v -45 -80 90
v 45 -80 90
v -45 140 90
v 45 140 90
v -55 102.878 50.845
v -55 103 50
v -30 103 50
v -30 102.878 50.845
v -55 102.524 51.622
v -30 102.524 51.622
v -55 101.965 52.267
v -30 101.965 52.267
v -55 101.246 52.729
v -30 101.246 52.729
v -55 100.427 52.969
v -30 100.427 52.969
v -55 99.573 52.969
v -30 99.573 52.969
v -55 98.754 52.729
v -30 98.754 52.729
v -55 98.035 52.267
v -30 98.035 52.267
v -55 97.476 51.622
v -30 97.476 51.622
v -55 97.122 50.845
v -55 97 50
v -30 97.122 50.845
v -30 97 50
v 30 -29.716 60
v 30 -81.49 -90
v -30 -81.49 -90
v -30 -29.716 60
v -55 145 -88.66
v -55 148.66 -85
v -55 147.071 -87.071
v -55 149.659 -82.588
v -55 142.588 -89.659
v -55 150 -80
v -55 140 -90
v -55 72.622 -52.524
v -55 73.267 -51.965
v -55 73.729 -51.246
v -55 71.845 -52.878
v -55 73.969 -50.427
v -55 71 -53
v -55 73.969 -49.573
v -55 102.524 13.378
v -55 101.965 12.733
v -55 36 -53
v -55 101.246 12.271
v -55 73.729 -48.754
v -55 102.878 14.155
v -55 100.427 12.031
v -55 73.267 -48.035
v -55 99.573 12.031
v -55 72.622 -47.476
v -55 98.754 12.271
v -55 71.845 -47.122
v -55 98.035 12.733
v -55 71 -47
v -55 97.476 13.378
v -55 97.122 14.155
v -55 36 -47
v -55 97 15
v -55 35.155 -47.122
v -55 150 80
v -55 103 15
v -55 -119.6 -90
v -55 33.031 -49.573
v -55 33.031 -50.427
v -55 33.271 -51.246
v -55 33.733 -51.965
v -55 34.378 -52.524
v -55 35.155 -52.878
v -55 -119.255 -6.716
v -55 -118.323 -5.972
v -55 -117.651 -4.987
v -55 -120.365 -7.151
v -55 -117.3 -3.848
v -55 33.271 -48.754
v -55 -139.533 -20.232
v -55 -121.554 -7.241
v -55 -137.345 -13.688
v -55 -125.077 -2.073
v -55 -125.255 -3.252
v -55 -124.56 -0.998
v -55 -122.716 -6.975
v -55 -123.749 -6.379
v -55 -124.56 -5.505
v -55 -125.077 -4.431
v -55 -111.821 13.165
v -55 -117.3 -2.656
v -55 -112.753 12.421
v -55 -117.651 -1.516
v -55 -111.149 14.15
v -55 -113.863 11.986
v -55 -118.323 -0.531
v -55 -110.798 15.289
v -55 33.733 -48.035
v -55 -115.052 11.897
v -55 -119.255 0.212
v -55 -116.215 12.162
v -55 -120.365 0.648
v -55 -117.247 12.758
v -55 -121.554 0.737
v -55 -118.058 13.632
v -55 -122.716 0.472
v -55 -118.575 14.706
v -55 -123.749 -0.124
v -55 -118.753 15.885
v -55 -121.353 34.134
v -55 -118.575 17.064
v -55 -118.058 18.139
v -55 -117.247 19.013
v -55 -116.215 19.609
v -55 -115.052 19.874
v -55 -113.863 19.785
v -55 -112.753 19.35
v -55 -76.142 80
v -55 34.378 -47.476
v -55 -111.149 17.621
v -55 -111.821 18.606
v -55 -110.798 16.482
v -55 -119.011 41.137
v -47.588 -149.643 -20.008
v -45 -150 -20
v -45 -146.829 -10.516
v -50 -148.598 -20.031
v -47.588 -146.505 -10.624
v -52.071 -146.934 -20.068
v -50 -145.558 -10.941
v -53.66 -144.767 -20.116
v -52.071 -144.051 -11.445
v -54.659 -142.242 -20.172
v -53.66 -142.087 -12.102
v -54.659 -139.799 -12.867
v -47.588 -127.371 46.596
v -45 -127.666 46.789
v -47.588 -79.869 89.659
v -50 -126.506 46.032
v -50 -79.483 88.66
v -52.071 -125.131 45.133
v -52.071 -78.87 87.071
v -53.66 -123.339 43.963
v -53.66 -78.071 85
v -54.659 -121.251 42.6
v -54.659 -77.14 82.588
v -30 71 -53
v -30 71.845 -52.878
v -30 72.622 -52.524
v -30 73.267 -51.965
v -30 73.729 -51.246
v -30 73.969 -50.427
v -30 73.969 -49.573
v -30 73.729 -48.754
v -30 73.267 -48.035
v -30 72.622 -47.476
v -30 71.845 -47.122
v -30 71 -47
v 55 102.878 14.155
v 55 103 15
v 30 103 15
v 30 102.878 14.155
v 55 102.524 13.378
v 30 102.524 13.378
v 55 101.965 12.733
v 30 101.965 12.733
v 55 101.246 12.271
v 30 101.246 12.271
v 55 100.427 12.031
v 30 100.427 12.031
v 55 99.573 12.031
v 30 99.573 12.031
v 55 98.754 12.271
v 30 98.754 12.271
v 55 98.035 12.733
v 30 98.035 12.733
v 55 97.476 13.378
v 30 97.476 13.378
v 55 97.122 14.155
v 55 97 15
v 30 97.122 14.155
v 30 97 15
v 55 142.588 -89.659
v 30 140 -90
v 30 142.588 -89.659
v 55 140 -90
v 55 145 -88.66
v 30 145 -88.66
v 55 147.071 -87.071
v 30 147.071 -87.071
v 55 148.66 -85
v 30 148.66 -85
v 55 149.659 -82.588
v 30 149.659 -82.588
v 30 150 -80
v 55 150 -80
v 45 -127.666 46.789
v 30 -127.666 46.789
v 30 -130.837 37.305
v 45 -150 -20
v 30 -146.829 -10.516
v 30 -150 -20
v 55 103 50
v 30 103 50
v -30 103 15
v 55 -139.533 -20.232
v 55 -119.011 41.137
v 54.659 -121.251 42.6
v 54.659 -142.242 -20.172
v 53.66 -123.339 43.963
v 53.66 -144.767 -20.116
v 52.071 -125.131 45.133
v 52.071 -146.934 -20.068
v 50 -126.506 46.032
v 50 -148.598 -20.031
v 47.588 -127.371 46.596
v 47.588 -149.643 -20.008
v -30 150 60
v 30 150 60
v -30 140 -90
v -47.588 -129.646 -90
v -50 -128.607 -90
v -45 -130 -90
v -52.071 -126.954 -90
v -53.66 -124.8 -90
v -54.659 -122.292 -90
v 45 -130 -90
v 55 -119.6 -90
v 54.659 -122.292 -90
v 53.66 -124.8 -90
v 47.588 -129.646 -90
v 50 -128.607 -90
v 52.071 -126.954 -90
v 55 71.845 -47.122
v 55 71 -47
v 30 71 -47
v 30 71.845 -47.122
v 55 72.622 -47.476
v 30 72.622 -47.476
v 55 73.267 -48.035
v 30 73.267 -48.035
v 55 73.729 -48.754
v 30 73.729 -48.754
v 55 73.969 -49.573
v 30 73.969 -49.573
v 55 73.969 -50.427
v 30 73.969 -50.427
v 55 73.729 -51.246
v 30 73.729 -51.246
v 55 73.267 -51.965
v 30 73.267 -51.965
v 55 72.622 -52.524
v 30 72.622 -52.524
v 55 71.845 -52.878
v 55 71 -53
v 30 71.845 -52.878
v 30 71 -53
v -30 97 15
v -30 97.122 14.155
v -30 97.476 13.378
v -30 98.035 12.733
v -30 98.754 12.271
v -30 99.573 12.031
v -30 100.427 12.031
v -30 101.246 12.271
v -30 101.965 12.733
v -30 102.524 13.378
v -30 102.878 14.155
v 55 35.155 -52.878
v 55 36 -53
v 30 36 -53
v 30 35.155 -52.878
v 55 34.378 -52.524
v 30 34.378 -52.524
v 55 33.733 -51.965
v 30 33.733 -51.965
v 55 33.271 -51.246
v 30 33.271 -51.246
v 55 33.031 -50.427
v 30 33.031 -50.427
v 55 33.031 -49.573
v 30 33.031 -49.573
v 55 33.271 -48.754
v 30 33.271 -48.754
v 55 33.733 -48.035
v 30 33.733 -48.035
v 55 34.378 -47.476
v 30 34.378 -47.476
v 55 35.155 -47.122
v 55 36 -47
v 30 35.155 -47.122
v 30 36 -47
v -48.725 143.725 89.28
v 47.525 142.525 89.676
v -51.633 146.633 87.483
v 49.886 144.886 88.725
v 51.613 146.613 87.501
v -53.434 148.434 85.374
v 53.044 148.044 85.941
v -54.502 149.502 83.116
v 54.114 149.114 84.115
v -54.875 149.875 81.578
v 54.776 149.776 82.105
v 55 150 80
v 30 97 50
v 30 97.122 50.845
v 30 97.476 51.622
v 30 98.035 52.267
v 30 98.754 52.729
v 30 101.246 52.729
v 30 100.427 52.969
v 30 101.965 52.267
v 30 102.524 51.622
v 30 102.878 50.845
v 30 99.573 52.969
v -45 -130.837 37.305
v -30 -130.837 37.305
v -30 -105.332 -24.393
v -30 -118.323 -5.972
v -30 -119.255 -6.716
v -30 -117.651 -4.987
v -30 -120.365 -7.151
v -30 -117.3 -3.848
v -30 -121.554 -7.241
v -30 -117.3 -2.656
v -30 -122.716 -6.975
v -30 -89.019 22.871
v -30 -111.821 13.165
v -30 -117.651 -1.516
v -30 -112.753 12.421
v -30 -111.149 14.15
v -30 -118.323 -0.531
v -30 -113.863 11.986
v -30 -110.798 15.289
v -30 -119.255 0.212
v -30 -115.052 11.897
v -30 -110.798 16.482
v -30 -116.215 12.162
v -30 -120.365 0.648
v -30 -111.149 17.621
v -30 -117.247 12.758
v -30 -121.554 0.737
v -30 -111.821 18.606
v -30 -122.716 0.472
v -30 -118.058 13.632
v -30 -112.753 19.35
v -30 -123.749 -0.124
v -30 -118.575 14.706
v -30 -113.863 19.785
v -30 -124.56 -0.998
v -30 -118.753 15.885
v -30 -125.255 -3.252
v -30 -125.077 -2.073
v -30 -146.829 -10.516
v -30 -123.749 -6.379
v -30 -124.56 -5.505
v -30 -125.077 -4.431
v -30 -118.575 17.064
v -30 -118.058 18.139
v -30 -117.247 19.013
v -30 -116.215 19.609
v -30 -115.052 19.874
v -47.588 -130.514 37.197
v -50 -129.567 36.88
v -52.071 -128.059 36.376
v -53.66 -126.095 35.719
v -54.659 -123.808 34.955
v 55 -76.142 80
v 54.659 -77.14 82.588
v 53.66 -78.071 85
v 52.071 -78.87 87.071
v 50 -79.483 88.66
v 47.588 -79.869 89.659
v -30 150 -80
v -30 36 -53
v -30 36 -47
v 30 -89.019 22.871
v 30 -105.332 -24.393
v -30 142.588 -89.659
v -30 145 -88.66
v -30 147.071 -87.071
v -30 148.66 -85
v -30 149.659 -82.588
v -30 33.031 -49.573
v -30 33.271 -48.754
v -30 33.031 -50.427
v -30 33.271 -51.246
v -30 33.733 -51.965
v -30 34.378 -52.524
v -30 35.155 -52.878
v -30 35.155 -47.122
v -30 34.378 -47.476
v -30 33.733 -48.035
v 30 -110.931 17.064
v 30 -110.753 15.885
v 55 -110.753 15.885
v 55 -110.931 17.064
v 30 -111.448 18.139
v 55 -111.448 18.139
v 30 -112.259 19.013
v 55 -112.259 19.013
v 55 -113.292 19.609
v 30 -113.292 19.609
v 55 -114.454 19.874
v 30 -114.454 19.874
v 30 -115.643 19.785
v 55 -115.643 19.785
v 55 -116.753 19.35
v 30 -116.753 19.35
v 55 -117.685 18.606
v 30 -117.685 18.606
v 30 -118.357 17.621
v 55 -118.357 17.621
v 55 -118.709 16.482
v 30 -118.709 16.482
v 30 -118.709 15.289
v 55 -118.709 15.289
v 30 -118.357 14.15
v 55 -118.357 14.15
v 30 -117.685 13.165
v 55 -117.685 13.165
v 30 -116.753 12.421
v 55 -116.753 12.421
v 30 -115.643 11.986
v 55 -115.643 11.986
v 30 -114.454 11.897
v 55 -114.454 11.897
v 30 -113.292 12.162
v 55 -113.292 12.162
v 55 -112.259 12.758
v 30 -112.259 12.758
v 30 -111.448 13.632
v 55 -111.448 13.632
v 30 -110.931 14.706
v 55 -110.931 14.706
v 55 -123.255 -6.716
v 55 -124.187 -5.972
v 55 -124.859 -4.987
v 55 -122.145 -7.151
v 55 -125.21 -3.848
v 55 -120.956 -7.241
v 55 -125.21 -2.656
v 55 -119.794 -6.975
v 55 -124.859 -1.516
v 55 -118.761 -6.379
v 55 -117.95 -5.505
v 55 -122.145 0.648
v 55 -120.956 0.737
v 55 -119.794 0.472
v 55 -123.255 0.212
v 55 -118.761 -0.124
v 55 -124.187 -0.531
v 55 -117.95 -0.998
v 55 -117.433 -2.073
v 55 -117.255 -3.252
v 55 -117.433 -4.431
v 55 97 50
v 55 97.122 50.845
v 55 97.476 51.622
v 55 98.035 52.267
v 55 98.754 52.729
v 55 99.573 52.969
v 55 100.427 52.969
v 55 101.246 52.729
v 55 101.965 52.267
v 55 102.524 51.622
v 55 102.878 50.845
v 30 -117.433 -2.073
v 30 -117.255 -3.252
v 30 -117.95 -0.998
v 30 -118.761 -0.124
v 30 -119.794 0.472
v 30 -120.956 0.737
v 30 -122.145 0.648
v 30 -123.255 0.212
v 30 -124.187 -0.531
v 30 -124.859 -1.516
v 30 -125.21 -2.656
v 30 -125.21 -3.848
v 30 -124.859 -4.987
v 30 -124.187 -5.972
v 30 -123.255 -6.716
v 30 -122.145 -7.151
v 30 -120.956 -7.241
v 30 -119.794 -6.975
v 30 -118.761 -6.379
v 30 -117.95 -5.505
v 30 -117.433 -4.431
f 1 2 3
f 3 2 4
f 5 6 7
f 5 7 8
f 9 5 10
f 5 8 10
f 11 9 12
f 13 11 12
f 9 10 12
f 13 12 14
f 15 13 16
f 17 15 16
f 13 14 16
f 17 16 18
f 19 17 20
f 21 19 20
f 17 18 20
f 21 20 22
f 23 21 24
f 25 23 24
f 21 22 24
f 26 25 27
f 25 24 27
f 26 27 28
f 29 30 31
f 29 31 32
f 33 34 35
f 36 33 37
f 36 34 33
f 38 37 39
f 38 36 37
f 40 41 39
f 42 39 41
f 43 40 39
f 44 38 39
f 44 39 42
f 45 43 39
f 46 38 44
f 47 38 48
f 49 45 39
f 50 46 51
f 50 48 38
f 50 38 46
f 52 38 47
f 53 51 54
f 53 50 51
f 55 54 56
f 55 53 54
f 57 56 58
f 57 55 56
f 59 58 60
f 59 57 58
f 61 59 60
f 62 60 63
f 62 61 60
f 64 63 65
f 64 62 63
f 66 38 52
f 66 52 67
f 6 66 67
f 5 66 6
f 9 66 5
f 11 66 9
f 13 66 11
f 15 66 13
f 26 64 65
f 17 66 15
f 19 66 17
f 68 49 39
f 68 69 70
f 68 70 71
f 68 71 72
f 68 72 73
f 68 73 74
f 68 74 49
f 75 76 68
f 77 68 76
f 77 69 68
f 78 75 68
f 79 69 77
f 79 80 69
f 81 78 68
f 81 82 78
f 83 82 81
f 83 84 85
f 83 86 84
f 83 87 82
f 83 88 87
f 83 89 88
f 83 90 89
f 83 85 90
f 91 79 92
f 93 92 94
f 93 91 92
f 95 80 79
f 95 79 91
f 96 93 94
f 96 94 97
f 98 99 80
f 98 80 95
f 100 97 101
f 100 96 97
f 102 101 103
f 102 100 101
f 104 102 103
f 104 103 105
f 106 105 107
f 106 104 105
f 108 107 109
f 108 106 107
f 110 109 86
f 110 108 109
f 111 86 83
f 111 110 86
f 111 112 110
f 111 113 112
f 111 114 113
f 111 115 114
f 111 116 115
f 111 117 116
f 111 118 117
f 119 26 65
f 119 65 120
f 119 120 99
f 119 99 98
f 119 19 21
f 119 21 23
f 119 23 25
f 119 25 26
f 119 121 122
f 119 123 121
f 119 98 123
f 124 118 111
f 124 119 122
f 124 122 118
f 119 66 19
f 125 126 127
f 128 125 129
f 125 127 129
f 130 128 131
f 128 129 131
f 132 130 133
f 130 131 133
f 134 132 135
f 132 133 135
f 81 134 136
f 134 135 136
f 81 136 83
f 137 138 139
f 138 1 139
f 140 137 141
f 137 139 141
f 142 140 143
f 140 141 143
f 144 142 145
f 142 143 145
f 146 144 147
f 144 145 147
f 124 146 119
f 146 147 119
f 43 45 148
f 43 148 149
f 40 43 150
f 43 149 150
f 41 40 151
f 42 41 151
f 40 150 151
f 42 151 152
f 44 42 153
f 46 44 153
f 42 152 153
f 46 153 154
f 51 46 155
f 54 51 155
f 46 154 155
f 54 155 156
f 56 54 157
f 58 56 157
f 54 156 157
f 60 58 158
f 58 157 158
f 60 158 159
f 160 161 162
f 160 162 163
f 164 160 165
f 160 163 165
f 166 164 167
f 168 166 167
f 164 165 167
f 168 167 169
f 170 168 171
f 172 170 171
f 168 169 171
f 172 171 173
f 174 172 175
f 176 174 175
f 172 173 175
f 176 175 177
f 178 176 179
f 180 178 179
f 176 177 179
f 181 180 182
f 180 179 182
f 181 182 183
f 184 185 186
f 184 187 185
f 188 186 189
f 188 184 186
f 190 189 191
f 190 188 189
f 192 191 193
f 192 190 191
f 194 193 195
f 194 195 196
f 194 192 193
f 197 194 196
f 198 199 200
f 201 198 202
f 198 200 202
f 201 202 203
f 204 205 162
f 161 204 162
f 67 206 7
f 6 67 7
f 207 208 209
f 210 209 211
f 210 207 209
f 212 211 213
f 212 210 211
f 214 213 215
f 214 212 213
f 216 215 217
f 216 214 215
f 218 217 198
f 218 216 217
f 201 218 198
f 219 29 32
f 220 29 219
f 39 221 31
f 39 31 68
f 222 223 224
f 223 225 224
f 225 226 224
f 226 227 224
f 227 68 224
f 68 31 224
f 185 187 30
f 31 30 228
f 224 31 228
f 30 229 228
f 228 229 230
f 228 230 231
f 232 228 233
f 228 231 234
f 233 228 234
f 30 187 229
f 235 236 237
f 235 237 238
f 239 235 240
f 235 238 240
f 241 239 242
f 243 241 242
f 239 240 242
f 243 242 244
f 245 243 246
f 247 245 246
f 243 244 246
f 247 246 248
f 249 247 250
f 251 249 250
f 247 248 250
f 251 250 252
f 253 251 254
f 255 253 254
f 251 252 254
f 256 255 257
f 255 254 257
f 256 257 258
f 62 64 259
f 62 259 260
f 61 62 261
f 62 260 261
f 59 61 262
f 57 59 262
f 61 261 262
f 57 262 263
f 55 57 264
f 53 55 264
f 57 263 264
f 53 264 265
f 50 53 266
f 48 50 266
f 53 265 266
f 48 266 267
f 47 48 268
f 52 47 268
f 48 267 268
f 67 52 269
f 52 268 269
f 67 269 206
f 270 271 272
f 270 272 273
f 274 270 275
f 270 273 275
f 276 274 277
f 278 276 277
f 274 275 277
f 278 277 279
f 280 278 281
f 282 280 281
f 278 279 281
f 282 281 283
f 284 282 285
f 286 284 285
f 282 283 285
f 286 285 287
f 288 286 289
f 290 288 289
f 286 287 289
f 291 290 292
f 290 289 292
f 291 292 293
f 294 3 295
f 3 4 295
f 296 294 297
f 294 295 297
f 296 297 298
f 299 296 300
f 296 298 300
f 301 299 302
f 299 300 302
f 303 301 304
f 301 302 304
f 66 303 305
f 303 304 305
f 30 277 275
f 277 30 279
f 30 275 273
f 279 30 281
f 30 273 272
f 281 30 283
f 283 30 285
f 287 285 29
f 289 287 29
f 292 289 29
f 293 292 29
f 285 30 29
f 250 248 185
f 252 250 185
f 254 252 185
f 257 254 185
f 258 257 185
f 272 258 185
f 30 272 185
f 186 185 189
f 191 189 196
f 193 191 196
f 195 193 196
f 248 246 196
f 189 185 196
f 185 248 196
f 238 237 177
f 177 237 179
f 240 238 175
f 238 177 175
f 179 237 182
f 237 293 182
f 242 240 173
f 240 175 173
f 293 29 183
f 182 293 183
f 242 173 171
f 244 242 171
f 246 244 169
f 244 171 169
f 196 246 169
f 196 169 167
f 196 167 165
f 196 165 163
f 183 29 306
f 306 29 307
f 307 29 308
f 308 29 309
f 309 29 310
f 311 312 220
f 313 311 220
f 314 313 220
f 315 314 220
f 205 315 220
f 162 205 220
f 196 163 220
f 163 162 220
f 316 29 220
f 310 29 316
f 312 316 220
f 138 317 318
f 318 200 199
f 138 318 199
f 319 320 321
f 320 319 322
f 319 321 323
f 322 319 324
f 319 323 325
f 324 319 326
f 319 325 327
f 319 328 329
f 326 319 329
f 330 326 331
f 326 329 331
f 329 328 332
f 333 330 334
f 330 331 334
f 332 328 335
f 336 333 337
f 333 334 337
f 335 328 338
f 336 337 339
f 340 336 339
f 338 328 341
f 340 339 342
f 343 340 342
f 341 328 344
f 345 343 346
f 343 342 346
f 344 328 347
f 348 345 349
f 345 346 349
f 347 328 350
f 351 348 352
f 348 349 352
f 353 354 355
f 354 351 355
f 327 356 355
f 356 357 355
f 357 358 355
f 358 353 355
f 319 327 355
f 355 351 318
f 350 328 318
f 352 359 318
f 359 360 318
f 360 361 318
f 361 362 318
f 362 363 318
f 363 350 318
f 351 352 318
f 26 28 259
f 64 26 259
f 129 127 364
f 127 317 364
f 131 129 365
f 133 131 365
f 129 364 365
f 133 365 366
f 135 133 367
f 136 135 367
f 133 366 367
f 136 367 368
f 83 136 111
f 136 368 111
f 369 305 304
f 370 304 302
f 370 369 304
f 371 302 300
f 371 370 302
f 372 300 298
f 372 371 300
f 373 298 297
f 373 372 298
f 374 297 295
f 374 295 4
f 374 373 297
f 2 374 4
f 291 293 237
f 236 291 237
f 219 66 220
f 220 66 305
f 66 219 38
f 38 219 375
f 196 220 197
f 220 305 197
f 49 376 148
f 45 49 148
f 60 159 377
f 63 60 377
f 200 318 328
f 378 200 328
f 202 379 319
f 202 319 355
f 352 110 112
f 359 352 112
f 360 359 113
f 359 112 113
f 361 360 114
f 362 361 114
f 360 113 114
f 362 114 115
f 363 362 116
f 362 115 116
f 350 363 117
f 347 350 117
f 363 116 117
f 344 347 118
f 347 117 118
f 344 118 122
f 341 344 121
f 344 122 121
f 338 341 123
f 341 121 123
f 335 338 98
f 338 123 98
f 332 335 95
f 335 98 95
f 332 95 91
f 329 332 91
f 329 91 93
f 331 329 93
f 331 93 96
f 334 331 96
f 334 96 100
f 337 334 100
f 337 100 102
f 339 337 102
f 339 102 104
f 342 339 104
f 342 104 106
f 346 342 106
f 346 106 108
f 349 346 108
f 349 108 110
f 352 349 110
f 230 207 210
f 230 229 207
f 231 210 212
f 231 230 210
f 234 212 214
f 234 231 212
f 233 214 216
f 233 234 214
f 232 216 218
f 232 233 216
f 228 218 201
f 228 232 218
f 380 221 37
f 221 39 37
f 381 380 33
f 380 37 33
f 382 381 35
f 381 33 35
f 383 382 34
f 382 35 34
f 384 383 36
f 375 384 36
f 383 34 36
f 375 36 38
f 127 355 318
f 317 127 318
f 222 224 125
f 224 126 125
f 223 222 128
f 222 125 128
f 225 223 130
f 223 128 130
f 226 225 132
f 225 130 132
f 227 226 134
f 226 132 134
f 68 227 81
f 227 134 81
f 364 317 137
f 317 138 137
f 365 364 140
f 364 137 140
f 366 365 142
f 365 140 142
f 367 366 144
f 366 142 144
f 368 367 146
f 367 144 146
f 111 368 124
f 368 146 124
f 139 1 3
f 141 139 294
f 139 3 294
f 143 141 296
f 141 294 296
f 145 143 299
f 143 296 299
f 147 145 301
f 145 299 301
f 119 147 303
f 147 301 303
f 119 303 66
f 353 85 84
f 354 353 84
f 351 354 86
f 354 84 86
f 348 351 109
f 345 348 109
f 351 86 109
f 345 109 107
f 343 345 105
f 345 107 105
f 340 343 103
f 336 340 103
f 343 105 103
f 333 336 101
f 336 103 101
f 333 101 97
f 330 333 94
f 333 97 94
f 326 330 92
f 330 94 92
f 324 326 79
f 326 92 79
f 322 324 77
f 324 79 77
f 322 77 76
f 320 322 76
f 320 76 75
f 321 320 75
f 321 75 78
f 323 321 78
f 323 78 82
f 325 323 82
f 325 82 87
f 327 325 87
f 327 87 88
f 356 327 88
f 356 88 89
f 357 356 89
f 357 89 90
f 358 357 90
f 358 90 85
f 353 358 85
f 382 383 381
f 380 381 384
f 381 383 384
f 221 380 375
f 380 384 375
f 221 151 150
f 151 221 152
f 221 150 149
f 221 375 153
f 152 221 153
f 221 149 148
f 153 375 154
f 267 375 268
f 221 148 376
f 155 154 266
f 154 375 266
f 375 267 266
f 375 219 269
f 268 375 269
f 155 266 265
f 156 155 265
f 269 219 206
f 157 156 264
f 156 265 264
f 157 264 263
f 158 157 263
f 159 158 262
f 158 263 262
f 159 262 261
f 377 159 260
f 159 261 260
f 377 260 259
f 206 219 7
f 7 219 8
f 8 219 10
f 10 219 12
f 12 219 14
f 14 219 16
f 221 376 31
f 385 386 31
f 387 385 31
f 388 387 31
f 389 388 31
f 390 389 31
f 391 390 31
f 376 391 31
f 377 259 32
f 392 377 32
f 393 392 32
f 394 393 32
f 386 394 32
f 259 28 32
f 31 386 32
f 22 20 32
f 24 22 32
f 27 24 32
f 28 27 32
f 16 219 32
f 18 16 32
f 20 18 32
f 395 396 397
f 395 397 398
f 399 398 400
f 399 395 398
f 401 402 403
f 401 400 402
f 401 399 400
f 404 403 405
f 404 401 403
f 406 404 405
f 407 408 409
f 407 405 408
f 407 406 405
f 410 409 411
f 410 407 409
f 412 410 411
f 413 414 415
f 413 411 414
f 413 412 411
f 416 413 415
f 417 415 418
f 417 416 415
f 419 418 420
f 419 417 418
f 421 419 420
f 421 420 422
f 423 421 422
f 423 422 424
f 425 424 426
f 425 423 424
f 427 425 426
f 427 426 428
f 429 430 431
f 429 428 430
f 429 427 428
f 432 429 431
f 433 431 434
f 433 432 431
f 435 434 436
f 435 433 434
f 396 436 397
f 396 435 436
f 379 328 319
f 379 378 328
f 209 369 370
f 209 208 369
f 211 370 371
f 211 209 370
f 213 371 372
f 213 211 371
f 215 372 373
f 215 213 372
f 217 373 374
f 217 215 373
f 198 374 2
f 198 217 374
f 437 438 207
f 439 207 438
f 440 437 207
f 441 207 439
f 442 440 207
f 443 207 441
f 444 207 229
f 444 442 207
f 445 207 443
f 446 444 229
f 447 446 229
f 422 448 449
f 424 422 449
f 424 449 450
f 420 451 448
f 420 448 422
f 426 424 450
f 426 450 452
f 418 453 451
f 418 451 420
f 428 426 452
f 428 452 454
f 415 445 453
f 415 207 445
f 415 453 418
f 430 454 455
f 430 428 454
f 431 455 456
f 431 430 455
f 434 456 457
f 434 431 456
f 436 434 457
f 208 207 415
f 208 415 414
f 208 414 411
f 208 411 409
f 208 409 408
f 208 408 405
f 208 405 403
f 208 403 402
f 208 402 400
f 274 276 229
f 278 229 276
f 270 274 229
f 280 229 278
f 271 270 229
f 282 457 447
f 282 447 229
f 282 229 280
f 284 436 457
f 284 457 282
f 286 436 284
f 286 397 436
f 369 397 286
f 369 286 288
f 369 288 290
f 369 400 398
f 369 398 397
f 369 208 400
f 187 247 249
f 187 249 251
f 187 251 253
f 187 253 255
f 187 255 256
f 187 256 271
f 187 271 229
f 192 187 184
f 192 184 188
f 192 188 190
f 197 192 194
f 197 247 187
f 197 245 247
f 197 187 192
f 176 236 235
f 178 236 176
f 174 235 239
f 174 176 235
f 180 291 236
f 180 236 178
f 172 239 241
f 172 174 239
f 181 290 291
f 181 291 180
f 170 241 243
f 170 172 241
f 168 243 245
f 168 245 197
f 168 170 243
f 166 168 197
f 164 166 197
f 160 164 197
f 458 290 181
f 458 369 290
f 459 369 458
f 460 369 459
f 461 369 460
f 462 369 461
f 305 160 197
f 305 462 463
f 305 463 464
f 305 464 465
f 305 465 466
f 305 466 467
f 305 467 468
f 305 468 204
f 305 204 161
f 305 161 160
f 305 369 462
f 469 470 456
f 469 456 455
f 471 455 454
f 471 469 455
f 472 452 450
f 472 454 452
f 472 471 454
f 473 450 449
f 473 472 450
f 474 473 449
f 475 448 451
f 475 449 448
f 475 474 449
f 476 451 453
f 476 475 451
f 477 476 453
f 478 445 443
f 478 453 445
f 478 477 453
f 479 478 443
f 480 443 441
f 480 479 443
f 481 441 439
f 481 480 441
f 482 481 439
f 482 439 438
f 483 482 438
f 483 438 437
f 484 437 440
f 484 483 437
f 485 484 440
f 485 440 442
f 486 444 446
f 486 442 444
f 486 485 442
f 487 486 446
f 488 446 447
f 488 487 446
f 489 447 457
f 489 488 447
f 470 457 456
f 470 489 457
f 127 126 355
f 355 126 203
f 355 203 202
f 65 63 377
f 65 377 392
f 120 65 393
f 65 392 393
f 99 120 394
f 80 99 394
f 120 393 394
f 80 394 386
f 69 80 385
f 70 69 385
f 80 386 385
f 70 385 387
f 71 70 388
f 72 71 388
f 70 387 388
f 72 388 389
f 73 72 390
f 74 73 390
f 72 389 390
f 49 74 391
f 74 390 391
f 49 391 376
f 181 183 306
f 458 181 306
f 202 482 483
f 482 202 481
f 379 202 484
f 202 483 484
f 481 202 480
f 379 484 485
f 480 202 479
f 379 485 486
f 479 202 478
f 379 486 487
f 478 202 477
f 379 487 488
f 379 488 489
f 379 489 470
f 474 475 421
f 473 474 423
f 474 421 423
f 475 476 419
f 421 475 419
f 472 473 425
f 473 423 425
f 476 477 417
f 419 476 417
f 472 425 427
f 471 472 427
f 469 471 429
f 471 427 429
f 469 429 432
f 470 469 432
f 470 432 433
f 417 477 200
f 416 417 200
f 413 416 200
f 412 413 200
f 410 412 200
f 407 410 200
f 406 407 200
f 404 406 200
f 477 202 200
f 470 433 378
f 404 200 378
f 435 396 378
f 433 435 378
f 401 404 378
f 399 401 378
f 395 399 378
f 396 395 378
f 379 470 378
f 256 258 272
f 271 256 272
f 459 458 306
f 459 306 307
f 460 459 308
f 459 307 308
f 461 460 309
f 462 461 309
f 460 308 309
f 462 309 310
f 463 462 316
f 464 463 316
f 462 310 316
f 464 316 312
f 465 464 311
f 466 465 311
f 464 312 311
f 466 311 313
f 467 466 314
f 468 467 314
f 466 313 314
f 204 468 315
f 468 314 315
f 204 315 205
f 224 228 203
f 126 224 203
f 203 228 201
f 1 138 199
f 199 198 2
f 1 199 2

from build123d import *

# Parameters (mm, degrees)
F1_DEPTH = 30
F2_R     = 4
F3_DEPTH = 25
F5_DEPTH = 25
F6_R     = 10
F7_D     = 8


with BuildPart() as f1:
    # F0 (on Right) → F1 (new body, symmetric)
    with BuildSketch(Plane.YZ):
        Polygon((-89.018595, 22.871135), (-105.332031, -24.392718), (-146.828609, -10.51621), (-150, -20), (-130, -90), (-81.489667, -90), (-29.716161, 60), (-24.538811, 75), (-19.36146, 90), (-80, 90), (-127.665719, 46.788867), (-130.83711, 37.305077), align=None)
        Polygon((150, 90), (-19.36146, 90), (-24.538811, 75), (-29.716161, 60), (150, 60), align=None)
    extrude(amount=F1_DEPTH, both=True)

    # F2 (on face) → F3 (join)
    with BuildSketch(Plane.YZ.offset(30)):
        Polygon((-80, 90), (-127.665719, 46.788867), (-150, -20), (-130, -90), (150, -90), (150, 90), align=None)
        with Locations((-121.254994, -3.25178)):
            Circle(F2_R, mode=Mode.SUBTRACT)
        with BuildLine():
            Line((71, -53), (36, -53))
            ThreePointArc((36, -53), (33, -50), (36, -47))
            Line((36, -47), (71, -47))
            ThreePointArc((71, -47), (74, -50), (71, -53))
        make_face(mode=Mode.SUBTRACT)
        with Locations((-114.753178, 15.885422)):
            Circle(F2_R, mode=Mode.SUBTRACT)
        with BuildLine():
            Line((103, 50), (103, 15))
            ThreePointArc((103, 15), (100, 12), (97, 15))
            Line((97, 15), (97, 50))
            ThreePointArc((97, 50), (100, 53), (103, 50))
        make_face(mode=Mode.SUBTRACT)
    extrude(amount=F3_DEPTH)

    # F4 (on face) → F5 (join)
    with BuildSketch(Plane(origin=(-30, 0, 0), x_dir=(0, -1, 0), z_dir=(-1, 0, 0))):
        Polygon((29.716161, 60), (-150, 60), (-150, -90), (81.489667, -90), align=None)
        with BuildLine():
            Line((-71, -47), (-36, -47))
            ThreePointArc((-36, -47), (-33, -50), (-36, -53))
            Line((-36, -53), (-71, -53))
            ThreePointArc((-71, -53), (-74, -50), (-71, -47))
        make_face(mode=Mode.SUBTRACT)
        with BuildLine():
            ThreePointArc((-97, 15), (-100, 12), (-103, 15))
            Line((-103, 15), (-103, 50))
            ThreePointArc((-103, 50), (-100, 53), (-97, 50))
            Line((-97, 50), (-97, 15))
        make_face(mode=Mode.SUBTRACT)
        Polygon((130.83711, 37.305077), (127.665719, 46.788867), (80, 90), (-150, 90), (-150, 60), (29.716161, 60), (81.489667, -90), (130, -90), (150, -20), (146.828609, -10.51621), (105.332031, -24.392718), (89.018595, 22.871135), align=None)
        Polygon((146.828609, -10.51621), (130.83711, 37.305077), (89.018595, 22.871135), (105.332031, -24.392718), align=None)
    extrude(amount=F5_DEPTH)

    # F6
    f6_edges = [f1.edges().sort_by_distance(p)[0] for p in [
        (55, 35, 90),
        (55, -103.832859, 68.394433),
        (55, -140, -55),
        (-55, -140, -55),
        (-55, -103.832859, 68.394433),
        (-55, 35, 90),
        (0, 150, 90),
        (-42.5, 150, -90),
        (42.5, 150, -90),
        (-55, -138.832859, 13.394433),
        (55, -138.832859, 13.394433),
    ]]
    fillet(f6_edges, radius=F6_R)

    # F7 (through all)
    with Locations(Plane.YZ.offset(30)):
        with Locations((-114.753178, 15.885422), (-121.254994, -3.25178)):
            Hole(F7_D / 2)


solid = f1.part
